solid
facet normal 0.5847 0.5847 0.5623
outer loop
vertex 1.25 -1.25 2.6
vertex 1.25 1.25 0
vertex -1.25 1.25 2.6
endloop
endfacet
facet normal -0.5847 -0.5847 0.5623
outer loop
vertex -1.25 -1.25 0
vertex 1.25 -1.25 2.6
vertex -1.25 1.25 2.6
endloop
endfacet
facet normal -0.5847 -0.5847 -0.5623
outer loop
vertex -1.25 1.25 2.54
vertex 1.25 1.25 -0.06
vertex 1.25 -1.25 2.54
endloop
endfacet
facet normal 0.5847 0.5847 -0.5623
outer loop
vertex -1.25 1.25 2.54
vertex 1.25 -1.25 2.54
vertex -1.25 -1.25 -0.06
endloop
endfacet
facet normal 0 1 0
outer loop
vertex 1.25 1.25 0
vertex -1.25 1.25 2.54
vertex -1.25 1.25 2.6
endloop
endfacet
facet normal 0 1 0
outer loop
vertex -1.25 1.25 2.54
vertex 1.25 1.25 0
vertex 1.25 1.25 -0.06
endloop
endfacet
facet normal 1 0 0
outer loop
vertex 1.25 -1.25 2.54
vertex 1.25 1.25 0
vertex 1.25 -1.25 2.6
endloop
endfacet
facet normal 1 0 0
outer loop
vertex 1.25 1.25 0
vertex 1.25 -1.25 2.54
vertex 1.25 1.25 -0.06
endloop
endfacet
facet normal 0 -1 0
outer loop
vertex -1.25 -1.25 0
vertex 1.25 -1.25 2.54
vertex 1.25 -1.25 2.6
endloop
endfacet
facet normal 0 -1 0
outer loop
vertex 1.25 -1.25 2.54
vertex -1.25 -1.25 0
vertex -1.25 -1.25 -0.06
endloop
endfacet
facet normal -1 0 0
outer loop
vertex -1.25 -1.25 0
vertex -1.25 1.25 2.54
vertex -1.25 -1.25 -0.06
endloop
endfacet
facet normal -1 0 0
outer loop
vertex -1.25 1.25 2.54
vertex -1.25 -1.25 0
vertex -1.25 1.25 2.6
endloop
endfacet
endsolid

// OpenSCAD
// Tent shell kit: roof saddle. See lib/lodge_kit.scad.
include <lib/lodge_kit.scad>
kind = "tent";
roof_tile([1, 0, 1, 0], 0);
